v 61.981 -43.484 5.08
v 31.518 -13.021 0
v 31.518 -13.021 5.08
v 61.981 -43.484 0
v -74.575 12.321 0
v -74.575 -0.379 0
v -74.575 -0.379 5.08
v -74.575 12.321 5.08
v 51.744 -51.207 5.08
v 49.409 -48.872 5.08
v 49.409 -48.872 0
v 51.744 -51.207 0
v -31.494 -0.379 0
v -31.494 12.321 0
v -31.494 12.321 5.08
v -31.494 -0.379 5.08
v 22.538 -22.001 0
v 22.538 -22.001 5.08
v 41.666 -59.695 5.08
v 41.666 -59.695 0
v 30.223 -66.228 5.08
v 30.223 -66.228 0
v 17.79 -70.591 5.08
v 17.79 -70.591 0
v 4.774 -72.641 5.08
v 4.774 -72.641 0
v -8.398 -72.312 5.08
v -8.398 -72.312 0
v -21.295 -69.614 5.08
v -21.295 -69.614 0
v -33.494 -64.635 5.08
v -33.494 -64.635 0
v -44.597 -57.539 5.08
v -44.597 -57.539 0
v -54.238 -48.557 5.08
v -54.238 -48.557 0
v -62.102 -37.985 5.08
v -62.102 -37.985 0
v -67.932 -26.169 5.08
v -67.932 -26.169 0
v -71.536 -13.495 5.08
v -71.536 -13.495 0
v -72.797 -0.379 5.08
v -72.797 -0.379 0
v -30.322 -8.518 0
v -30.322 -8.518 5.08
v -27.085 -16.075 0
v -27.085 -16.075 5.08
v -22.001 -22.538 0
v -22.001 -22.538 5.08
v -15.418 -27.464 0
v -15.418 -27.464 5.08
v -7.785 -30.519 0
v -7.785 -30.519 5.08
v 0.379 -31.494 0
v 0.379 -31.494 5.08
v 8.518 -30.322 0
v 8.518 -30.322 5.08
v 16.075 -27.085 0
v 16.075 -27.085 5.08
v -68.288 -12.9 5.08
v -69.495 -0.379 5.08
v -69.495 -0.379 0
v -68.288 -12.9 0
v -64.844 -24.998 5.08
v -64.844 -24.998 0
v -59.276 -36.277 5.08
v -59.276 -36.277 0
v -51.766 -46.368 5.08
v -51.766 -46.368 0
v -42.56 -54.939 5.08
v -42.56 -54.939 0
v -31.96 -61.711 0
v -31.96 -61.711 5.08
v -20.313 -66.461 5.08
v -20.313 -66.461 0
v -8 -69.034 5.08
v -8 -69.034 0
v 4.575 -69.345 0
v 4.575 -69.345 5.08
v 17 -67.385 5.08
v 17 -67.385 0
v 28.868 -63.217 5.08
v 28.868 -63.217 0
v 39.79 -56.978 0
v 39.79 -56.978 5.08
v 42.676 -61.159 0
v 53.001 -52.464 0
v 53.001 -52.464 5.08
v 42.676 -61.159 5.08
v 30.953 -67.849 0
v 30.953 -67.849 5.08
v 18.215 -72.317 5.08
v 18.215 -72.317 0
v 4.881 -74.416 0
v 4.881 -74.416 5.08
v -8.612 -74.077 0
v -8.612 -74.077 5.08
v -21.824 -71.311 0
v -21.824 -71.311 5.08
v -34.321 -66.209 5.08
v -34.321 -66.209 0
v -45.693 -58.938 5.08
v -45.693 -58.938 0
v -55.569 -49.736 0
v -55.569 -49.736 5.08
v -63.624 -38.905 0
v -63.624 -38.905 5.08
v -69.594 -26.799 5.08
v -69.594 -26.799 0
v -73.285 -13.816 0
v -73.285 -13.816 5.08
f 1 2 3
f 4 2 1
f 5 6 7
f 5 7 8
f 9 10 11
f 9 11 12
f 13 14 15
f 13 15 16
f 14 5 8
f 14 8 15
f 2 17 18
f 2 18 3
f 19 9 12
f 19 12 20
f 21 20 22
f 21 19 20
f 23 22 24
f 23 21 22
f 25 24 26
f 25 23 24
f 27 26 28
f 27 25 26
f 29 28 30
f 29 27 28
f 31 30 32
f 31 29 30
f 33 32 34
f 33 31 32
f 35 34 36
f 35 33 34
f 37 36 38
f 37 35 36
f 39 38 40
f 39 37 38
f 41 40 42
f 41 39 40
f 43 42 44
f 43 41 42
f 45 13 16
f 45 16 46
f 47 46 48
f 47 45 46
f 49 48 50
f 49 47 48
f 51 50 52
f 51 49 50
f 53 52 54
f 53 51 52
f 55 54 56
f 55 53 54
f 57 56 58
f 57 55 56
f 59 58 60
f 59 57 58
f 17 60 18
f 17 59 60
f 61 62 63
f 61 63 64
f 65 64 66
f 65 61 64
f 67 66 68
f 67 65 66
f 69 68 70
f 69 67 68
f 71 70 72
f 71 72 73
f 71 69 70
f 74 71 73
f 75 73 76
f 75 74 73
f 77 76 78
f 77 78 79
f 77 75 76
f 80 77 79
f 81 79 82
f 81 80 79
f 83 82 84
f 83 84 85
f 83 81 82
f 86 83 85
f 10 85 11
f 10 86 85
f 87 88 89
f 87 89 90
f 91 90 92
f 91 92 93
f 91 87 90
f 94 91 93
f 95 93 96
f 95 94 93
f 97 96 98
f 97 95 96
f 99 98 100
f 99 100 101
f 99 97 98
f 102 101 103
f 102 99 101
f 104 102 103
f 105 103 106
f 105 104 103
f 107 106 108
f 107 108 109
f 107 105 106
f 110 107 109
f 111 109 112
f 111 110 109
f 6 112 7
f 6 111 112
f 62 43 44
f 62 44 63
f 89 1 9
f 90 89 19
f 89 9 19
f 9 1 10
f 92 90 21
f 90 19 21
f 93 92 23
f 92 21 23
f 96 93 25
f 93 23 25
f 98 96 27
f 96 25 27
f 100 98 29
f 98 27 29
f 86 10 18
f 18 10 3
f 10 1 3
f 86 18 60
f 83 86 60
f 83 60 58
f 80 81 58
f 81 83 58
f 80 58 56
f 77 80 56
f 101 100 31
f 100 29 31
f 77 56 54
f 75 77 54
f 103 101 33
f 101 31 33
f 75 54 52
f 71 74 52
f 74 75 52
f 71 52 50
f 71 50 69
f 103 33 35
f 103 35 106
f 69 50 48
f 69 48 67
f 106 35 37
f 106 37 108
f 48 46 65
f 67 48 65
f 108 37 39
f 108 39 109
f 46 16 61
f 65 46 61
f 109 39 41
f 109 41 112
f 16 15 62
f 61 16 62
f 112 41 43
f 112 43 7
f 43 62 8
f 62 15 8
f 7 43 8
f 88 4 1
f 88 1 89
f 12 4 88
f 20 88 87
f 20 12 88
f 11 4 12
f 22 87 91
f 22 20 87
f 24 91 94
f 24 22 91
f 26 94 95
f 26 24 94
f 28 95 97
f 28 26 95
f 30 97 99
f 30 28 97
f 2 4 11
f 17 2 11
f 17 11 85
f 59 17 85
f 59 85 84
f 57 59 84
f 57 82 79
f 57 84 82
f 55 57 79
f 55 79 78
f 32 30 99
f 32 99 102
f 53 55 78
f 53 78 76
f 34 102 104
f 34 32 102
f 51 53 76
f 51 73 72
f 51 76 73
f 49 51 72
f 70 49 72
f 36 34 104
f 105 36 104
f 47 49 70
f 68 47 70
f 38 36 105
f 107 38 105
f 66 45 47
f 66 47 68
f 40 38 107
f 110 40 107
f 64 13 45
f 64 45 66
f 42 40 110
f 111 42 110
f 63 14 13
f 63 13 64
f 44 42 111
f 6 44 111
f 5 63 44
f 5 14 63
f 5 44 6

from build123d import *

# Parameters (mm, degrees)
BOSS_EXTRUDE3_DEPTH = 5.08
CUT_EXTRUDE1_DEPTH  = 106.587982078


with BuildPart() as part:
    # Sketch2 → Boss-Extrude3 (new body)
    with BuildSketch(Plane.XY):
        with BuildLine():
            Line((22.537725188, -22.001112684), (31.517981309, -13.020856563))
            Line((31.517981309, -13.020856563), (61.981075074, -43.483950327))
            Line((61.981075074, -43.483950327), (53.000818953, -52.464206448))
            ThreePointArc((53.000818953, -52.464206448), (-28.188071212, -69.043554437), (-74.575034639, -0.379442341))
            Line((-74.575034639, -0.379442341), (-74.575034639, 12.320557659))
            Line((-74.575034639, 12.320557659), (-31.493714286, 12.320557659))
            Line((-31.493714286, 12.320557659), (-31.493714286, -0.379442341))
            ThreePointArc((-31.493714286, -0.379442341), (-11.701563668, -29.241604329), (22.537725188, -22.001112684))
        make_face()
    extrude(amount=BOSS_EXTRUDE3_DEPTH)

    # Sketch3 → Cut-Extrude1 (cut, through all)
    with BuildSketch(Plane.XY.offset(5.08)):
        with BuildLine():
            Line((-72.797011063, -0.379442341), (-69.494964077, -0.379442341))
            ThreePointArc((-69.494964077, -0.379442341), (-26.244012372, -64.35018122), (49.408666609, -48.872054105))
            Line((49.408666609, -48.872054105), (51.743566425, -51.20695392))
            ThreePointArc((51.743566425, -51.20695392), (-27.507651047, -67.400874846), (-72.797011063, -0.379442341))
        make_face()
    extrude(amount=-CUT_EXTRUDE1_DEPTH, mode=Mode.SUBTRACT)


solid = part.part
